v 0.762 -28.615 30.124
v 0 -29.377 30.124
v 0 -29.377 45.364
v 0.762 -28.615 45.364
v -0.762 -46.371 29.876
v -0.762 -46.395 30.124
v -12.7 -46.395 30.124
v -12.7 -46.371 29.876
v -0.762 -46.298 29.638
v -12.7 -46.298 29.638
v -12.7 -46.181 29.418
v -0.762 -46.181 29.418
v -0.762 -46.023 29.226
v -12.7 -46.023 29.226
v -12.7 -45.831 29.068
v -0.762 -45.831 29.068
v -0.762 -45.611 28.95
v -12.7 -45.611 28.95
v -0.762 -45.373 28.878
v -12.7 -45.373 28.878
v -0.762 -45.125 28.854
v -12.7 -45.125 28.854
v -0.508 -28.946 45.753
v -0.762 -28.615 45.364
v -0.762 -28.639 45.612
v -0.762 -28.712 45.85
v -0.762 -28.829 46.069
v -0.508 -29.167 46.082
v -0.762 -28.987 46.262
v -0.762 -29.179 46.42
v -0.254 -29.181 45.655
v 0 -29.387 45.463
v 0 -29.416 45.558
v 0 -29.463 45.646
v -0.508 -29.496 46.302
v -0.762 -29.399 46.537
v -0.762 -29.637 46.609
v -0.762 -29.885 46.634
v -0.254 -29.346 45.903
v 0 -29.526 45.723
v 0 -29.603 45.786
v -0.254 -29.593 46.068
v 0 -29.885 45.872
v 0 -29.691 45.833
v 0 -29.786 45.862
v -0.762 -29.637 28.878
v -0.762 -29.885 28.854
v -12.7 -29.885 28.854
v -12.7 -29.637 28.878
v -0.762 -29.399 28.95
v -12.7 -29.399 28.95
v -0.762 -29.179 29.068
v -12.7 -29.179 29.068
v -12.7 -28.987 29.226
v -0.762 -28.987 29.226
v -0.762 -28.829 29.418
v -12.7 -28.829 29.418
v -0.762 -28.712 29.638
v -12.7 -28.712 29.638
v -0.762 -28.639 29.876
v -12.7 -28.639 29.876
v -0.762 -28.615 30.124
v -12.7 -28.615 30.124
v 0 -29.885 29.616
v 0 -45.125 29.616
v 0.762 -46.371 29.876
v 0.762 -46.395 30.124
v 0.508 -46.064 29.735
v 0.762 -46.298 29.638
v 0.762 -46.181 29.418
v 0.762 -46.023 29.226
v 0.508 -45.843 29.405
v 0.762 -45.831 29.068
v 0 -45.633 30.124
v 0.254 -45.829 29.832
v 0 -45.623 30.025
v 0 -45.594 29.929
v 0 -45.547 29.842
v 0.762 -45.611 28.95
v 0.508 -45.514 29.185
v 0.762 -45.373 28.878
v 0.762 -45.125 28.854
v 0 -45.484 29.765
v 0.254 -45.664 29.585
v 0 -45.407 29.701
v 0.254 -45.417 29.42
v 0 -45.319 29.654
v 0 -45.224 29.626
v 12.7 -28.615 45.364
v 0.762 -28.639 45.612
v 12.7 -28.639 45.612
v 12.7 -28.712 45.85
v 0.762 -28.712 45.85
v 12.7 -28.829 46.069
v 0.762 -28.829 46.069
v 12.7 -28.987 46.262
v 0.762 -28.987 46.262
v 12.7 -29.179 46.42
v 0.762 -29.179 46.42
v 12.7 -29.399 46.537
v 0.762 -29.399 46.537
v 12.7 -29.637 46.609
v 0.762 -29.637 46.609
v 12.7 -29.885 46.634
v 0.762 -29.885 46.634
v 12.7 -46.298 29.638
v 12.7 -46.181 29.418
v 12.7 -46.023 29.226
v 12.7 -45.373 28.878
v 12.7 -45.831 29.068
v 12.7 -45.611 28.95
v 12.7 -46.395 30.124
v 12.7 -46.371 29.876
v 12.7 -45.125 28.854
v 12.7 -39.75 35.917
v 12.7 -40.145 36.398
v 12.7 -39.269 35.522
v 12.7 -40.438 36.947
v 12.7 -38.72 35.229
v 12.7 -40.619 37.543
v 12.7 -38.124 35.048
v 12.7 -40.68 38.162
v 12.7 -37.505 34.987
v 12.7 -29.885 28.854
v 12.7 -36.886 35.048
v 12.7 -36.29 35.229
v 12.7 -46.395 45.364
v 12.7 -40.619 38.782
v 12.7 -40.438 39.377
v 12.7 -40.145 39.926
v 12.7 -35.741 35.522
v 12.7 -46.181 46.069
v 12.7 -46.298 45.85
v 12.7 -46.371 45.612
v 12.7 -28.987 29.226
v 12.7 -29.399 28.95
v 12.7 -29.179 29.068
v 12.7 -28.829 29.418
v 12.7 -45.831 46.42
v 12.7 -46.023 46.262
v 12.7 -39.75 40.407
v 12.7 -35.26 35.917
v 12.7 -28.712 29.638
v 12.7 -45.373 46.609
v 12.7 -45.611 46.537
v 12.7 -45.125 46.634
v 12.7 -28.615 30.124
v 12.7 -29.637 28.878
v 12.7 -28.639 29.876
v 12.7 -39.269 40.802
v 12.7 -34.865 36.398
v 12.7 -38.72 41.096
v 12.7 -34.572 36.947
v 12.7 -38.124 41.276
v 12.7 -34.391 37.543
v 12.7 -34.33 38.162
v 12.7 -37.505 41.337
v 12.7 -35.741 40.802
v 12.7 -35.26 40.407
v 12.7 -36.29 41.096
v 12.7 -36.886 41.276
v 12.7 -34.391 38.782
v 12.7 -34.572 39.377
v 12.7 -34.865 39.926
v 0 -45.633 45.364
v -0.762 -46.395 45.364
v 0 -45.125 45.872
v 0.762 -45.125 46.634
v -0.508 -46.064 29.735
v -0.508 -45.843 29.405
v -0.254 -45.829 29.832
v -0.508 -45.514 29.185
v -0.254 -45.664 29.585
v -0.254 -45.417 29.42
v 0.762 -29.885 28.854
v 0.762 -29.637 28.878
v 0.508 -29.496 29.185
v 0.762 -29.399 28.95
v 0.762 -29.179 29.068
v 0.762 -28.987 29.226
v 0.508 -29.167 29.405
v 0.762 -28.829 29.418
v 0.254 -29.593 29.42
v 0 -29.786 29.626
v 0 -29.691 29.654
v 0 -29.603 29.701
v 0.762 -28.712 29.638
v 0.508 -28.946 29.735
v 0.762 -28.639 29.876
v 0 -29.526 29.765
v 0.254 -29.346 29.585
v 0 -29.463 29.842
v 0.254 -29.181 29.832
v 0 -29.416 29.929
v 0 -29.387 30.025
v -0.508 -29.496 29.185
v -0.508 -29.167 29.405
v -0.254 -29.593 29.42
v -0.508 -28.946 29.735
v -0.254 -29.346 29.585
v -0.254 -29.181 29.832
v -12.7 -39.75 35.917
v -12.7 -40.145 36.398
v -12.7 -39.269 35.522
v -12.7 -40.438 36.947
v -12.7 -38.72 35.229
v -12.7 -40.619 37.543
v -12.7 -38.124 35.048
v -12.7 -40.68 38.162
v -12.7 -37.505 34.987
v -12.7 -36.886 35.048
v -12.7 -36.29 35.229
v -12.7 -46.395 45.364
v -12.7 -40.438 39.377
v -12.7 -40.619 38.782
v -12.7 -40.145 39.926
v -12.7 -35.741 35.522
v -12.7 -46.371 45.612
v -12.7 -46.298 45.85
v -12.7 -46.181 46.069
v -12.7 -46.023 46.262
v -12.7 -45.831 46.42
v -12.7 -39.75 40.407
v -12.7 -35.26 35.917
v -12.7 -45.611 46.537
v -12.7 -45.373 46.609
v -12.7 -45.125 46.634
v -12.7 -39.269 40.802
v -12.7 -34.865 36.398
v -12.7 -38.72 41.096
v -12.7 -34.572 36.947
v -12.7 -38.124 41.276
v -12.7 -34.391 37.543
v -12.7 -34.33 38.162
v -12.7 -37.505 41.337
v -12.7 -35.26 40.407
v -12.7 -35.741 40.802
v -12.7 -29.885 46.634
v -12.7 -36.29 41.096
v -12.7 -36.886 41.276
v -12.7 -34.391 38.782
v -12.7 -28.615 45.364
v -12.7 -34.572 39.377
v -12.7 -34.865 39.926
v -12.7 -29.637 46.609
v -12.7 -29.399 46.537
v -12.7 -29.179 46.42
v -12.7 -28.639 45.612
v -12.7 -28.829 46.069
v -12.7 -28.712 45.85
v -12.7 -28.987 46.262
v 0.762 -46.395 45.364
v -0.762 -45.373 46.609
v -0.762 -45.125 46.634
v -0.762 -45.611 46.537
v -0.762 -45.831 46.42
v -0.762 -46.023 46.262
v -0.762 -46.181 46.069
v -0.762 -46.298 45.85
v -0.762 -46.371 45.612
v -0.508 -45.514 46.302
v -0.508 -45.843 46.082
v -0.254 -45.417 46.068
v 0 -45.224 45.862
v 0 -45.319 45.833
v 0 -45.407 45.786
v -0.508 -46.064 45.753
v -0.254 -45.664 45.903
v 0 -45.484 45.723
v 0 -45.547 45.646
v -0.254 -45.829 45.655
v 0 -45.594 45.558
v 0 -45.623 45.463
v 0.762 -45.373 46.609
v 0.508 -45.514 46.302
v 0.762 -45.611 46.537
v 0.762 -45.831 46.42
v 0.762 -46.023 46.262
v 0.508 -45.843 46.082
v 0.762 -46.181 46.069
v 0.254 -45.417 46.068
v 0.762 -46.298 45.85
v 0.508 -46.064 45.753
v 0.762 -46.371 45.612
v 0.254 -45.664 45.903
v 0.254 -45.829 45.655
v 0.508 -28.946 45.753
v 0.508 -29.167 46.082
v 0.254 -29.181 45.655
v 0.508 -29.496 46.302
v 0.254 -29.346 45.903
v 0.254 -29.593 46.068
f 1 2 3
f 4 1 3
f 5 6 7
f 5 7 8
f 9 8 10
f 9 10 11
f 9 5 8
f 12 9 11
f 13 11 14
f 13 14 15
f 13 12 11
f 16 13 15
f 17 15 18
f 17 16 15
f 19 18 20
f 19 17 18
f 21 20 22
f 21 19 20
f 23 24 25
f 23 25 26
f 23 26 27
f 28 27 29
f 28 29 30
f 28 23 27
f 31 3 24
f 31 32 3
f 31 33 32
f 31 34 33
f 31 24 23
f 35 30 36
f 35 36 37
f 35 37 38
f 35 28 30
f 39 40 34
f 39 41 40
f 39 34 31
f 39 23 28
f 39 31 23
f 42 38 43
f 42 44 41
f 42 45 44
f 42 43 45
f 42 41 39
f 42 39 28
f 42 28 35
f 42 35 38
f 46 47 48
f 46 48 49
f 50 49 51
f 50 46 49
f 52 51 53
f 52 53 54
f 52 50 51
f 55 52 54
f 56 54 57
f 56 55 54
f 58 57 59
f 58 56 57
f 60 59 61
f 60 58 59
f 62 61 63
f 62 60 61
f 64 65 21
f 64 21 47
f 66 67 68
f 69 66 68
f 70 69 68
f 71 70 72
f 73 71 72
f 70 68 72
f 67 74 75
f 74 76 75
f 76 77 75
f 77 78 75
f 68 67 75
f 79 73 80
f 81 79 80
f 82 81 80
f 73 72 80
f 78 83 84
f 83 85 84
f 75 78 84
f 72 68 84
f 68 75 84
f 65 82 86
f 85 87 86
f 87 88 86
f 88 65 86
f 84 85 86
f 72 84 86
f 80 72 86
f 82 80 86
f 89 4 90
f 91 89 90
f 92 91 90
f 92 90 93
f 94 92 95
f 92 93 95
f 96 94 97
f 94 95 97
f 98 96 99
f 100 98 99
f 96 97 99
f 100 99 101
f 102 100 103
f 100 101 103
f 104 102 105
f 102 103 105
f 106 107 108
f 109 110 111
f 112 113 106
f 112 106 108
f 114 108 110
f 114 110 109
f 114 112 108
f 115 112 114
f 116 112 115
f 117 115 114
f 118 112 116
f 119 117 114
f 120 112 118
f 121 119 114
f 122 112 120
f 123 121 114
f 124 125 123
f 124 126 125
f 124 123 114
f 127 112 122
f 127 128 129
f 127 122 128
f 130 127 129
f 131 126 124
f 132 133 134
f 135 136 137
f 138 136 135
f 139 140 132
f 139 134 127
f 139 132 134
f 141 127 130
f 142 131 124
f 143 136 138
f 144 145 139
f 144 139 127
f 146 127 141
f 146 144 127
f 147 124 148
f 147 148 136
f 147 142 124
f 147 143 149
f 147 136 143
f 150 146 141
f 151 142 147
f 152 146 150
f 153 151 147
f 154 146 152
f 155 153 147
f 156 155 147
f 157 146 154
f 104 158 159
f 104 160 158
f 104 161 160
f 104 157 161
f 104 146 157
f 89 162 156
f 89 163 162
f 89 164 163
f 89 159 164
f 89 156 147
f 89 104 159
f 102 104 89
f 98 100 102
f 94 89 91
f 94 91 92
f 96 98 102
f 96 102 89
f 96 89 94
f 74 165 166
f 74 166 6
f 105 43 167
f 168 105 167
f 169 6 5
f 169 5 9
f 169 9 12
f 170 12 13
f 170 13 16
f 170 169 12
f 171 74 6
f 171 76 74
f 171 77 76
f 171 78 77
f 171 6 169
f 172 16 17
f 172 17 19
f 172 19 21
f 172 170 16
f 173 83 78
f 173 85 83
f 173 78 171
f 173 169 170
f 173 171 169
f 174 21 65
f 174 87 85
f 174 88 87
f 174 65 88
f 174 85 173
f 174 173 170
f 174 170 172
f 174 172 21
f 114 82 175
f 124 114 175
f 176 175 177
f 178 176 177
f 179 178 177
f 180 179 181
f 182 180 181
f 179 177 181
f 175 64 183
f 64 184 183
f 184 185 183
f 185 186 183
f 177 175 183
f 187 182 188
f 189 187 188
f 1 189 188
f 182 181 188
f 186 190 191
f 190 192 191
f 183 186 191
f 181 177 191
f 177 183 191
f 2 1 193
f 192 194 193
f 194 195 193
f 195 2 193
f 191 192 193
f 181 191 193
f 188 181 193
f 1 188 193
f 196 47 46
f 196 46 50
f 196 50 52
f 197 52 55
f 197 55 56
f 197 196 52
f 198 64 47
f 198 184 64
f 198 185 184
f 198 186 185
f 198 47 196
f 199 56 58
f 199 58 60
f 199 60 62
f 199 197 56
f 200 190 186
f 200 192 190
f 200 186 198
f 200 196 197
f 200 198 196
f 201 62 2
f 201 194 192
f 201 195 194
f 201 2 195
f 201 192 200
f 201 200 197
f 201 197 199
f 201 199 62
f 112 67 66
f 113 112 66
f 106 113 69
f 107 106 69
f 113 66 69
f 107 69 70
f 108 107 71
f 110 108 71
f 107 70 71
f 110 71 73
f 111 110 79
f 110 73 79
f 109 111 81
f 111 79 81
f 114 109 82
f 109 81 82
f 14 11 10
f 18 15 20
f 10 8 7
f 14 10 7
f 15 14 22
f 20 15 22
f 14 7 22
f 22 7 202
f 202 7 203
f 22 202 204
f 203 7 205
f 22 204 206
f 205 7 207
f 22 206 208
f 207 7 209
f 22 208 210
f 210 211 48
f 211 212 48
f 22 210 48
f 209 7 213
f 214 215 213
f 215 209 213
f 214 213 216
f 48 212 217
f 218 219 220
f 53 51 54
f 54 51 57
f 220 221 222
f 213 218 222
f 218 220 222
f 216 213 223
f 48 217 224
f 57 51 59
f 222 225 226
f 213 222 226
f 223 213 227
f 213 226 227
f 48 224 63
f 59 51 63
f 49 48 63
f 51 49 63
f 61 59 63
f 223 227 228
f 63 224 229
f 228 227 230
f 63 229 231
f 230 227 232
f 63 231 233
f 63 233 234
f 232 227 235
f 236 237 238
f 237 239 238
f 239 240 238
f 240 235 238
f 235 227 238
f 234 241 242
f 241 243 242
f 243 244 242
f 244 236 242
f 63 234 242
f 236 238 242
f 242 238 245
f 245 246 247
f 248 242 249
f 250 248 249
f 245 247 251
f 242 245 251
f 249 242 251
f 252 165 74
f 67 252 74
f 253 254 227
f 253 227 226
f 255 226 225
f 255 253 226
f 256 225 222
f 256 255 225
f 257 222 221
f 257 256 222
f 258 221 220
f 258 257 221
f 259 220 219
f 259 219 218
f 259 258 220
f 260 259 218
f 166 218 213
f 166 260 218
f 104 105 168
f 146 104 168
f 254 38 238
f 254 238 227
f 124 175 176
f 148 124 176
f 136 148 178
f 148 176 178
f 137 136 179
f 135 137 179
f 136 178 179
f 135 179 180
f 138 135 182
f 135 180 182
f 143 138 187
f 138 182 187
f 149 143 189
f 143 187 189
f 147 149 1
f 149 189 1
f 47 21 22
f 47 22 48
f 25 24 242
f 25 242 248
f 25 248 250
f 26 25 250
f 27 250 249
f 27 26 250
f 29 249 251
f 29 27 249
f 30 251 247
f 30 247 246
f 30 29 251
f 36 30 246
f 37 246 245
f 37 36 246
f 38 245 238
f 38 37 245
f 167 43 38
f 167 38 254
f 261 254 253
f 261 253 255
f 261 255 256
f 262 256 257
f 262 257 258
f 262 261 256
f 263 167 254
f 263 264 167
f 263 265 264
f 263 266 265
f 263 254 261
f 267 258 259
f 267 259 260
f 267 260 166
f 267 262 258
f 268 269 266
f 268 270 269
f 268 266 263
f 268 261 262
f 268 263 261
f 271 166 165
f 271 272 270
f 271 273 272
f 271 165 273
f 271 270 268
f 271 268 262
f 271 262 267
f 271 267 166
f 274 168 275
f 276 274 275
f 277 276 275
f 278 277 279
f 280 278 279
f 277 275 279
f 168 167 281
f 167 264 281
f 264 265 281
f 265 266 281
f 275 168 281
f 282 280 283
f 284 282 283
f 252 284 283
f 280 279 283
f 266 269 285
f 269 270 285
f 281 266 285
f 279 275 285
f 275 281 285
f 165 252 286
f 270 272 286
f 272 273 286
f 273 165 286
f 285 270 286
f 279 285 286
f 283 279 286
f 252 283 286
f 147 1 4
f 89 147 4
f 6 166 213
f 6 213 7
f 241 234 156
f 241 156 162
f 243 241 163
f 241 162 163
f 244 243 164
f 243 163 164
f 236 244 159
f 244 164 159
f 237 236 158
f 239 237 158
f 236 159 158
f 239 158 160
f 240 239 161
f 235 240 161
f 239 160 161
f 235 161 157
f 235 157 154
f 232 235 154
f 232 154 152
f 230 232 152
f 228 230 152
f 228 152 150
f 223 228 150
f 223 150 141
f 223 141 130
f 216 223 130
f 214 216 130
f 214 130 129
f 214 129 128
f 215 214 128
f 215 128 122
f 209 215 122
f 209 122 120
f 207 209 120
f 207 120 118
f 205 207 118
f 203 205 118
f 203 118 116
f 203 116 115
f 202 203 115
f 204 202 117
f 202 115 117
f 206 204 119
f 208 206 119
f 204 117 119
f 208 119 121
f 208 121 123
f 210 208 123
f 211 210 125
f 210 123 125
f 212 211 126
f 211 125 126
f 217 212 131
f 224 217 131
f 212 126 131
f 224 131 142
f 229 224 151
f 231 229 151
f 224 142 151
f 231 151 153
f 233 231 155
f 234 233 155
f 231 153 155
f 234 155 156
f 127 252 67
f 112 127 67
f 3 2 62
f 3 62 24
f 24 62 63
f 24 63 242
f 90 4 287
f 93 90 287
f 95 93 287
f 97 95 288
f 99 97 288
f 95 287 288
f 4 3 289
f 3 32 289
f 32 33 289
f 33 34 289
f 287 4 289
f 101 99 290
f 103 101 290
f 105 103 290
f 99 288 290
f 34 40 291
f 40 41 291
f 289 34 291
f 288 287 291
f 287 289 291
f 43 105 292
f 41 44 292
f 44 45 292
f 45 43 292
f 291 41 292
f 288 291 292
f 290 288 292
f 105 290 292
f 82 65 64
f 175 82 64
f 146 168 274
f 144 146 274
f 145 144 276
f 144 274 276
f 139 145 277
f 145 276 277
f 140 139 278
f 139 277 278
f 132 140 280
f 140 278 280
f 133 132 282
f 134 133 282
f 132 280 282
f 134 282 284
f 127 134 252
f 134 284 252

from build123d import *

# Parameters (mm, degrees)
F1_DEPTH = 12.7
F2_SIZE  = 0.762
F4_R     = 3.175
F5_DEPTH = 25.401


with BuildPart() as f1:
    # F0 (on Right) → F1 (new body)
    with BuildSketch(Plane.YZ):
        with BuildLine():
            ThreePointArc((-45.125007, 46.633742), (-46.023033, 46.261768), (-46.395007, 45.363742))
            Line((-46.395007, 45.363742), (-46.395007, 30.123742))
            ThreePointArc((-46.395007, 30.123742), (-46.023033, 29.225717), (-45.125007, 28.853742))
            Line((-45.125007, 28.853742), (-29.885007, 28.853742))
            ThreePointArc((-29.885007, 28.853742), (-28.986982, 29.225717), (-28.615007, 30.123742))
            Line((-28.615007, 30.123742), (-28.615007, 45.363742))
            ThreePointArc((-28.615007, 45.363742), (-28.986982, 46.261768), (-29.885007, 46.633742))
            Line((-29.885007, 46.633742), (-45.125007, 46.633742))
        make_face()
    extrude(amount=F1_DEPTH)

    # F2
    f2_edges = [f1.edges().sort_by_distance(p)[0] for p in [
        (0, -37.505007, 46.633742),
        (0, -46.395007, 37.743742),
    ]]
    chamfer(f2_edges, length=F2_SIZE)

    # F3: F1 across plane


with BuildPart() as f1_1:
    add(f1.part)
    add(f1.part.mirror(Plane.YZ))

    # F4 (on face) → F5 (cut, through all)
    with BuildSketch(Plane.YZ.offset(12.7)):
        with Locations((-37.505007, 38.162194)):
            Circle(F4_R)
    extrude(amount=-F5_DEPTH, mode=Mode.SUBTRACT)


solid = f1_1.part
